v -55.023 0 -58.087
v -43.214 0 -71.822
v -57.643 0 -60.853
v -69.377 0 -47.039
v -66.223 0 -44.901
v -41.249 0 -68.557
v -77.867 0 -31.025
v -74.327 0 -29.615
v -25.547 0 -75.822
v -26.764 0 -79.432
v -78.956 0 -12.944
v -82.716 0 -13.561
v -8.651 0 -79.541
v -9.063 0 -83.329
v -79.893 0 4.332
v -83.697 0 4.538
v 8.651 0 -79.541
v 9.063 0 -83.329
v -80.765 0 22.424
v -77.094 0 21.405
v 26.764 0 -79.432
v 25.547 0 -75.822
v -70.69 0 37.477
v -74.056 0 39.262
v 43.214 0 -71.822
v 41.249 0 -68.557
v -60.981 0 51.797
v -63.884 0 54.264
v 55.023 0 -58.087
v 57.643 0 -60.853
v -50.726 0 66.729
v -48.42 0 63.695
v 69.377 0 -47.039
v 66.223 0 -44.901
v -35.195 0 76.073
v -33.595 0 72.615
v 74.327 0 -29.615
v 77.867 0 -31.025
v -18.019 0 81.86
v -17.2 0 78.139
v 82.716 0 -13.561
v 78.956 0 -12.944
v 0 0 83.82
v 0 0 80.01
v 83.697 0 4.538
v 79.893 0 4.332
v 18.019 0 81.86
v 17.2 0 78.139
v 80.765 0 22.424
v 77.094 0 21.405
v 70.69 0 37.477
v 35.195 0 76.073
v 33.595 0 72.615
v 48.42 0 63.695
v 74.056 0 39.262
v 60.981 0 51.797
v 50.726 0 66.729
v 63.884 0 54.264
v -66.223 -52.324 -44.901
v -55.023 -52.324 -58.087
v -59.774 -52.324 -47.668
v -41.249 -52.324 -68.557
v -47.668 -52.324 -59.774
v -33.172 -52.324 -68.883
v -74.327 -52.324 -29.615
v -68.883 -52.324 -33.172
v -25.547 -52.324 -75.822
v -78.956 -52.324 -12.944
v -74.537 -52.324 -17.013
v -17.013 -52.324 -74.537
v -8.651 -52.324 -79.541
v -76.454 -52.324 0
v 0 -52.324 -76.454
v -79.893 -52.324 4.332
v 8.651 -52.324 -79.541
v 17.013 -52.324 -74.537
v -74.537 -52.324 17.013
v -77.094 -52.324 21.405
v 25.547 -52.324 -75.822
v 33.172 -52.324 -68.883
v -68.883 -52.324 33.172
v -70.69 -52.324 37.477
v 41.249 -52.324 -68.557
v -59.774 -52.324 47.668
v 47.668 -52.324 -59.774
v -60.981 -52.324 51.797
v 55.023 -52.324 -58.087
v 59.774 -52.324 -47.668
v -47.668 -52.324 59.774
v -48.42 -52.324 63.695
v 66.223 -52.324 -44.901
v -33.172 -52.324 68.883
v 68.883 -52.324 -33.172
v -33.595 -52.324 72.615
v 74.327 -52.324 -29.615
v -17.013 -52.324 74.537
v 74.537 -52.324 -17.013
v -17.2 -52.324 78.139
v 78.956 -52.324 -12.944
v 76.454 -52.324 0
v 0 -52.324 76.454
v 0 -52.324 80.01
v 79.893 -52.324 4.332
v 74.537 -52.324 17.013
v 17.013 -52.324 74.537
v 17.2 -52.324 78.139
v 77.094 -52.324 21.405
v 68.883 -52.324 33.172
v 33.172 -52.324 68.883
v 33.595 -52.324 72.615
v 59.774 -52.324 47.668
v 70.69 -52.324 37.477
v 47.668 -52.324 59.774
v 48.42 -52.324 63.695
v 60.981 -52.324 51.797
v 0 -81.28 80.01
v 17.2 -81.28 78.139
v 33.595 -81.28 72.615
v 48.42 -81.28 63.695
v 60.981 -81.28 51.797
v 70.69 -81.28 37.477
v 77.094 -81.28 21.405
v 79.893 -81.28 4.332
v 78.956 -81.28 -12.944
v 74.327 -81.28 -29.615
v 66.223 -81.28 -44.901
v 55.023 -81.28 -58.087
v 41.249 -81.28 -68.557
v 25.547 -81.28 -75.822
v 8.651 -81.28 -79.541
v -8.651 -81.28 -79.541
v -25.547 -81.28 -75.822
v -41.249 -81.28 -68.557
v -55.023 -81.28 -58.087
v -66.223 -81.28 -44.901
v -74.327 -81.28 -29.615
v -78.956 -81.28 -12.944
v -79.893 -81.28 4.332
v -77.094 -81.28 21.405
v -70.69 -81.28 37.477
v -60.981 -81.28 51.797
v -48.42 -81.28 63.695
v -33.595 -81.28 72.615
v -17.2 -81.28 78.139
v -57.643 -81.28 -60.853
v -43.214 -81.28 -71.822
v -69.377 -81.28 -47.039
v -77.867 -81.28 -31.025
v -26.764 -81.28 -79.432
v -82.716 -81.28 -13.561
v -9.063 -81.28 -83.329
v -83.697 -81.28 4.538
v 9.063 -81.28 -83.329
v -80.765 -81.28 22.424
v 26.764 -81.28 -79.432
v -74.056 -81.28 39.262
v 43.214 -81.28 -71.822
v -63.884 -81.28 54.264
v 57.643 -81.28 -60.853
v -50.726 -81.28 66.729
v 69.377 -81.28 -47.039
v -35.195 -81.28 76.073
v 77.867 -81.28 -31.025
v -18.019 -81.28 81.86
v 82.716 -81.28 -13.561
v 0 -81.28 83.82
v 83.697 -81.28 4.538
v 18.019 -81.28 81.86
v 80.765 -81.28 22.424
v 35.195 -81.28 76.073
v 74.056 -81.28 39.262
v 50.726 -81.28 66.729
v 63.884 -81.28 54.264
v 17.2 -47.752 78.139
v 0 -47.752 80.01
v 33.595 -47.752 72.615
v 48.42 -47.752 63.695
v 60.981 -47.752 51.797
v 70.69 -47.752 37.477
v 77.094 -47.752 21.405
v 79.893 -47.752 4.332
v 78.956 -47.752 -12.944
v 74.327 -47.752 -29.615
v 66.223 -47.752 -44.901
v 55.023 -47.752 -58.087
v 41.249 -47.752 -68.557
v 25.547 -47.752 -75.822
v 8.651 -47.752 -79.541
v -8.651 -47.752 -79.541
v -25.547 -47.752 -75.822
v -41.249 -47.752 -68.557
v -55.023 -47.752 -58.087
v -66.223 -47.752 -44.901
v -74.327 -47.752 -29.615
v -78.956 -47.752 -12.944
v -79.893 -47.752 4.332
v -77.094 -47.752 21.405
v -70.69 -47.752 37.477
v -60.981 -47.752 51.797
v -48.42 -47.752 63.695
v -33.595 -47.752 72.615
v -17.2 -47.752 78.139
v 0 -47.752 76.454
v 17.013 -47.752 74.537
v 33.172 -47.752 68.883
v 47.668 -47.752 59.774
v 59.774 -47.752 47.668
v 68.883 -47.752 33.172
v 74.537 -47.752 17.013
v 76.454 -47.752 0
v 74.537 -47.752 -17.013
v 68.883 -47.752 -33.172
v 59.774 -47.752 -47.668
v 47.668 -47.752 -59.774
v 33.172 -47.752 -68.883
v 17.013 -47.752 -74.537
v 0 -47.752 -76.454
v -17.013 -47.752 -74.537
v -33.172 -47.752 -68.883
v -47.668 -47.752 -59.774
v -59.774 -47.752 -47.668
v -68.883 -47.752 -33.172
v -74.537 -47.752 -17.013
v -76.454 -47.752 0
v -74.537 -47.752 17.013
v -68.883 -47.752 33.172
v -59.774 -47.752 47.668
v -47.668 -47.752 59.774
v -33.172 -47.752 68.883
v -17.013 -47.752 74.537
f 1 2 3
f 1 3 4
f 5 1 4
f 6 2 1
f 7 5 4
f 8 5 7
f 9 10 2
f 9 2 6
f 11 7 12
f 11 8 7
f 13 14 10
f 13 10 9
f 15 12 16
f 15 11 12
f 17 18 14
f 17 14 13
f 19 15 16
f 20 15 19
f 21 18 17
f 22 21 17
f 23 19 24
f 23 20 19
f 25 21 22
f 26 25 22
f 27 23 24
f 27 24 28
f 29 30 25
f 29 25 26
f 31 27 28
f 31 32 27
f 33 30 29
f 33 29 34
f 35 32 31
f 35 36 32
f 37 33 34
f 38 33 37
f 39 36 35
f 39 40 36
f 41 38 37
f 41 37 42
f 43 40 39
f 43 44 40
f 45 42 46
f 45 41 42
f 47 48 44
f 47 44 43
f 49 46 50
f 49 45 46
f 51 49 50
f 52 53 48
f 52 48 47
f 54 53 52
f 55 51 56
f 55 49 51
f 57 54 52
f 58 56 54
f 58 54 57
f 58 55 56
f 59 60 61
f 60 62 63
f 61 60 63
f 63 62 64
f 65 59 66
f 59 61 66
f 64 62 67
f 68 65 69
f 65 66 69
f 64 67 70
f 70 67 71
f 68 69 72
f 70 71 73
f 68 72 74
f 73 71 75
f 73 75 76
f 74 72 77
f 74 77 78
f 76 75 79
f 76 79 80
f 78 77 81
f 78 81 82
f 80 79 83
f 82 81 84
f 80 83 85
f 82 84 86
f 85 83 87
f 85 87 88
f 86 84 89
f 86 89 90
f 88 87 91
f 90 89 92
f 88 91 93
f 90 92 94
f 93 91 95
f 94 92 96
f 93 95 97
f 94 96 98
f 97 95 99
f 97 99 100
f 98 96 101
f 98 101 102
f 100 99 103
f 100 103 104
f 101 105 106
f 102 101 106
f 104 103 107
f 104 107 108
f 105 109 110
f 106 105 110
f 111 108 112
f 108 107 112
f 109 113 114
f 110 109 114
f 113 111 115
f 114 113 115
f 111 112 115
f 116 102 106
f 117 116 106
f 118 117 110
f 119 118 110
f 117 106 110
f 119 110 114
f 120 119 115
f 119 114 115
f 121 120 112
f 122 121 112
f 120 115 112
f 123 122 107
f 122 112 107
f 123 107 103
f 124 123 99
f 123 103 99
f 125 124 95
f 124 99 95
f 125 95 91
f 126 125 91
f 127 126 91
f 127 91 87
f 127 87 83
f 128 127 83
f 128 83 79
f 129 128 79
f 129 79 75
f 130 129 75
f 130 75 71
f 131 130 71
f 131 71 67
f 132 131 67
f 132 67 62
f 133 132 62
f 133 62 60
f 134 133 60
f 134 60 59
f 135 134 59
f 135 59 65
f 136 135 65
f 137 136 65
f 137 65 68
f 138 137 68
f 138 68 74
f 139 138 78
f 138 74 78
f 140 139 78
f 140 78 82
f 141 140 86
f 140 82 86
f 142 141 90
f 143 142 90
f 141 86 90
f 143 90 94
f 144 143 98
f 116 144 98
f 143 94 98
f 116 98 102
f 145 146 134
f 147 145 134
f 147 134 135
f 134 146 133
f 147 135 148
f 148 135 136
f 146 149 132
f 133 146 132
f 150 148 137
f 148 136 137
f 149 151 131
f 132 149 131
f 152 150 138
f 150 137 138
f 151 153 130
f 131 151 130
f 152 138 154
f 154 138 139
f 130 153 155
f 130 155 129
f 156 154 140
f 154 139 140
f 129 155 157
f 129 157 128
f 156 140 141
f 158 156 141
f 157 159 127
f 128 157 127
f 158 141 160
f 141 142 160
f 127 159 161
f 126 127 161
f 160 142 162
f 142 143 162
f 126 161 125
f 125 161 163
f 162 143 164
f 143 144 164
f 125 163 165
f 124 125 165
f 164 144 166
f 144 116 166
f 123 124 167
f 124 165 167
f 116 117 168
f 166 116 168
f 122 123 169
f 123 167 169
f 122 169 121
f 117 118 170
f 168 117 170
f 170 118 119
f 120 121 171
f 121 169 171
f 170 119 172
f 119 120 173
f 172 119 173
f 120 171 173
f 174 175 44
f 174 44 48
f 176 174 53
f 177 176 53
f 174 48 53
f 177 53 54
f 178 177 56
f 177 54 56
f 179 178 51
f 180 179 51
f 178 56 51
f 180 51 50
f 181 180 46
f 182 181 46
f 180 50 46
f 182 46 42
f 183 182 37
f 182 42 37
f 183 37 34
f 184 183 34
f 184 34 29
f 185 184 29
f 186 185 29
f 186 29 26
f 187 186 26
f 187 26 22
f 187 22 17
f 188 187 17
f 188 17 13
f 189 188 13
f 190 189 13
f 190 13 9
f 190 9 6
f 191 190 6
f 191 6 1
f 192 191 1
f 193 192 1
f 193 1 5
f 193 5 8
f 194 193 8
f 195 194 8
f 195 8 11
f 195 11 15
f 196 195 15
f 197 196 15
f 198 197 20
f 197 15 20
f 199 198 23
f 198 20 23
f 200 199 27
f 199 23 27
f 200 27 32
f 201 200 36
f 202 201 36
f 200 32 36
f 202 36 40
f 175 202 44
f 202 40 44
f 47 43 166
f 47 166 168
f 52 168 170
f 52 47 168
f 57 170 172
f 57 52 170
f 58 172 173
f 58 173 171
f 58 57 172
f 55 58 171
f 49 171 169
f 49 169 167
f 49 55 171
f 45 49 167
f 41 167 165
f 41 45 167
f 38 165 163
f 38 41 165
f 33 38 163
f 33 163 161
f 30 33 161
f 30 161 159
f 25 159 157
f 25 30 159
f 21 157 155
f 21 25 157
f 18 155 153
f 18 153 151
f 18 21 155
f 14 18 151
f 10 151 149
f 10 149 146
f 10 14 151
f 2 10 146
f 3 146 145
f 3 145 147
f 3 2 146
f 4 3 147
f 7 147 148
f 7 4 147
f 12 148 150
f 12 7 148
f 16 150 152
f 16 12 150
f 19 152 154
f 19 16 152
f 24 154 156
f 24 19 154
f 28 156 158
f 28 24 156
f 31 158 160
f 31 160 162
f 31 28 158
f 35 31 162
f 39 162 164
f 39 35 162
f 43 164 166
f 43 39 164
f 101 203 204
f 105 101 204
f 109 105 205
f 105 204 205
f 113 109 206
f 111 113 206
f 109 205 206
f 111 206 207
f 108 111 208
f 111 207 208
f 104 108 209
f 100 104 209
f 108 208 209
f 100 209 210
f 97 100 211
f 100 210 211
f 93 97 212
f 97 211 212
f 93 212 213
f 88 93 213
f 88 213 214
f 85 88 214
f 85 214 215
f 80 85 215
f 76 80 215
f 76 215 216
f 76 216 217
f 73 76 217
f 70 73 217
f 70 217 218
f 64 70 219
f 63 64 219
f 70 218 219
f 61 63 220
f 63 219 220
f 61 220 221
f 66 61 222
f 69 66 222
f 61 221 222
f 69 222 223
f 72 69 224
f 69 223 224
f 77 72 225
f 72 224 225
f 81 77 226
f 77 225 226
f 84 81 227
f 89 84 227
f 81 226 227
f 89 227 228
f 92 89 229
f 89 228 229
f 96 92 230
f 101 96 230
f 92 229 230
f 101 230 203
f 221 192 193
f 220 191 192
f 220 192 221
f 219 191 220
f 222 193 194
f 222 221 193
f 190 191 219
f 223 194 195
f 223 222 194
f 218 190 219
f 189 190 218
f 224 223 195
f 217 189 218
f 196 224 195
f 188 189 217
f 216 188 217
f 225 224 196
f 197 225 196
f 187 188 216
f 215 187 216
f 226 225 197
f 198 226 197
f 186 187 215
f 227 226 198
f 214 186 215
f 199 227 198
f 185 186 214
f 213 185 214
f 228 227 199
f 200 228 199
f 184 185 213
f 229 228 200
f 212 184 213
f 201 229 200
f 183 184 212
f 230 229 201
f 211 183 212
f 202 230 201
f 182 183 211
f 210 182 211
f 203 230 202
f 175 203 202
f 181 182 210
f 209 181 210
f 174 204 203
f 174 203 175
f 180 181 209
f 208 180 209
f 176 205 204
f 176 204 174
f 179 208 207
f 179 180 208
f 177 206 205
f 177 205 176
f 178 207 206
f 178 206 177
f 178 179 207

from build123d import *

# Parameters (mm, degrees)
CROQUIS2_R              = 83.82
CROQUIS2_R_2            = 80.01
SALIENTE_EXTRUIR1_DEPTH = 81.28
CROQUIS4_R              = 80.01
CROQUIS4_R_2            = 76.454
SALIENTE_EXTRUIR2_DEPTH = 4.572


with BuildPart() as part:
    # Croquis2 → Saliente-Extruir1 (new body)
    with BuildSketch(Plane(origin=(0, 0, 0), x_dir=(1, 0, 0), z_dir=(0, 1, 0))):
        with Locations(Location((0, 0, 0), (0, 0, 270))):
            Circle(CROQUIS2_R)
        with Locations(Location((0, 0, 0), (0, 0, 270))):
            Circle(CROQUIS2_R_2, mode=Mode.SUBTRACT)
    extrude(amount=-SALIENTE_EXTRUIR1_DEPTH)

    # Croquis4 → Saliente-Extruir2 (add)
    with BuildSketch(Plane(origin=(0, -47.752, 0), x_dir=(1, 0, 0), z_dir=(0, 1, 0))):
        with Locations(Location((0, 0, 0), (0, 0, 270))):
            Circle(CROQUIS4_R)
        with Locations(Location((0, 0, 0), (0, 0, 270))):
            Circle(CROQUIS4_R_2, mode=Mode.SUBTRACT)
    extrude(amount=-SALIENTE_EXTRUIR2_DEPTH)


solid = part.part
